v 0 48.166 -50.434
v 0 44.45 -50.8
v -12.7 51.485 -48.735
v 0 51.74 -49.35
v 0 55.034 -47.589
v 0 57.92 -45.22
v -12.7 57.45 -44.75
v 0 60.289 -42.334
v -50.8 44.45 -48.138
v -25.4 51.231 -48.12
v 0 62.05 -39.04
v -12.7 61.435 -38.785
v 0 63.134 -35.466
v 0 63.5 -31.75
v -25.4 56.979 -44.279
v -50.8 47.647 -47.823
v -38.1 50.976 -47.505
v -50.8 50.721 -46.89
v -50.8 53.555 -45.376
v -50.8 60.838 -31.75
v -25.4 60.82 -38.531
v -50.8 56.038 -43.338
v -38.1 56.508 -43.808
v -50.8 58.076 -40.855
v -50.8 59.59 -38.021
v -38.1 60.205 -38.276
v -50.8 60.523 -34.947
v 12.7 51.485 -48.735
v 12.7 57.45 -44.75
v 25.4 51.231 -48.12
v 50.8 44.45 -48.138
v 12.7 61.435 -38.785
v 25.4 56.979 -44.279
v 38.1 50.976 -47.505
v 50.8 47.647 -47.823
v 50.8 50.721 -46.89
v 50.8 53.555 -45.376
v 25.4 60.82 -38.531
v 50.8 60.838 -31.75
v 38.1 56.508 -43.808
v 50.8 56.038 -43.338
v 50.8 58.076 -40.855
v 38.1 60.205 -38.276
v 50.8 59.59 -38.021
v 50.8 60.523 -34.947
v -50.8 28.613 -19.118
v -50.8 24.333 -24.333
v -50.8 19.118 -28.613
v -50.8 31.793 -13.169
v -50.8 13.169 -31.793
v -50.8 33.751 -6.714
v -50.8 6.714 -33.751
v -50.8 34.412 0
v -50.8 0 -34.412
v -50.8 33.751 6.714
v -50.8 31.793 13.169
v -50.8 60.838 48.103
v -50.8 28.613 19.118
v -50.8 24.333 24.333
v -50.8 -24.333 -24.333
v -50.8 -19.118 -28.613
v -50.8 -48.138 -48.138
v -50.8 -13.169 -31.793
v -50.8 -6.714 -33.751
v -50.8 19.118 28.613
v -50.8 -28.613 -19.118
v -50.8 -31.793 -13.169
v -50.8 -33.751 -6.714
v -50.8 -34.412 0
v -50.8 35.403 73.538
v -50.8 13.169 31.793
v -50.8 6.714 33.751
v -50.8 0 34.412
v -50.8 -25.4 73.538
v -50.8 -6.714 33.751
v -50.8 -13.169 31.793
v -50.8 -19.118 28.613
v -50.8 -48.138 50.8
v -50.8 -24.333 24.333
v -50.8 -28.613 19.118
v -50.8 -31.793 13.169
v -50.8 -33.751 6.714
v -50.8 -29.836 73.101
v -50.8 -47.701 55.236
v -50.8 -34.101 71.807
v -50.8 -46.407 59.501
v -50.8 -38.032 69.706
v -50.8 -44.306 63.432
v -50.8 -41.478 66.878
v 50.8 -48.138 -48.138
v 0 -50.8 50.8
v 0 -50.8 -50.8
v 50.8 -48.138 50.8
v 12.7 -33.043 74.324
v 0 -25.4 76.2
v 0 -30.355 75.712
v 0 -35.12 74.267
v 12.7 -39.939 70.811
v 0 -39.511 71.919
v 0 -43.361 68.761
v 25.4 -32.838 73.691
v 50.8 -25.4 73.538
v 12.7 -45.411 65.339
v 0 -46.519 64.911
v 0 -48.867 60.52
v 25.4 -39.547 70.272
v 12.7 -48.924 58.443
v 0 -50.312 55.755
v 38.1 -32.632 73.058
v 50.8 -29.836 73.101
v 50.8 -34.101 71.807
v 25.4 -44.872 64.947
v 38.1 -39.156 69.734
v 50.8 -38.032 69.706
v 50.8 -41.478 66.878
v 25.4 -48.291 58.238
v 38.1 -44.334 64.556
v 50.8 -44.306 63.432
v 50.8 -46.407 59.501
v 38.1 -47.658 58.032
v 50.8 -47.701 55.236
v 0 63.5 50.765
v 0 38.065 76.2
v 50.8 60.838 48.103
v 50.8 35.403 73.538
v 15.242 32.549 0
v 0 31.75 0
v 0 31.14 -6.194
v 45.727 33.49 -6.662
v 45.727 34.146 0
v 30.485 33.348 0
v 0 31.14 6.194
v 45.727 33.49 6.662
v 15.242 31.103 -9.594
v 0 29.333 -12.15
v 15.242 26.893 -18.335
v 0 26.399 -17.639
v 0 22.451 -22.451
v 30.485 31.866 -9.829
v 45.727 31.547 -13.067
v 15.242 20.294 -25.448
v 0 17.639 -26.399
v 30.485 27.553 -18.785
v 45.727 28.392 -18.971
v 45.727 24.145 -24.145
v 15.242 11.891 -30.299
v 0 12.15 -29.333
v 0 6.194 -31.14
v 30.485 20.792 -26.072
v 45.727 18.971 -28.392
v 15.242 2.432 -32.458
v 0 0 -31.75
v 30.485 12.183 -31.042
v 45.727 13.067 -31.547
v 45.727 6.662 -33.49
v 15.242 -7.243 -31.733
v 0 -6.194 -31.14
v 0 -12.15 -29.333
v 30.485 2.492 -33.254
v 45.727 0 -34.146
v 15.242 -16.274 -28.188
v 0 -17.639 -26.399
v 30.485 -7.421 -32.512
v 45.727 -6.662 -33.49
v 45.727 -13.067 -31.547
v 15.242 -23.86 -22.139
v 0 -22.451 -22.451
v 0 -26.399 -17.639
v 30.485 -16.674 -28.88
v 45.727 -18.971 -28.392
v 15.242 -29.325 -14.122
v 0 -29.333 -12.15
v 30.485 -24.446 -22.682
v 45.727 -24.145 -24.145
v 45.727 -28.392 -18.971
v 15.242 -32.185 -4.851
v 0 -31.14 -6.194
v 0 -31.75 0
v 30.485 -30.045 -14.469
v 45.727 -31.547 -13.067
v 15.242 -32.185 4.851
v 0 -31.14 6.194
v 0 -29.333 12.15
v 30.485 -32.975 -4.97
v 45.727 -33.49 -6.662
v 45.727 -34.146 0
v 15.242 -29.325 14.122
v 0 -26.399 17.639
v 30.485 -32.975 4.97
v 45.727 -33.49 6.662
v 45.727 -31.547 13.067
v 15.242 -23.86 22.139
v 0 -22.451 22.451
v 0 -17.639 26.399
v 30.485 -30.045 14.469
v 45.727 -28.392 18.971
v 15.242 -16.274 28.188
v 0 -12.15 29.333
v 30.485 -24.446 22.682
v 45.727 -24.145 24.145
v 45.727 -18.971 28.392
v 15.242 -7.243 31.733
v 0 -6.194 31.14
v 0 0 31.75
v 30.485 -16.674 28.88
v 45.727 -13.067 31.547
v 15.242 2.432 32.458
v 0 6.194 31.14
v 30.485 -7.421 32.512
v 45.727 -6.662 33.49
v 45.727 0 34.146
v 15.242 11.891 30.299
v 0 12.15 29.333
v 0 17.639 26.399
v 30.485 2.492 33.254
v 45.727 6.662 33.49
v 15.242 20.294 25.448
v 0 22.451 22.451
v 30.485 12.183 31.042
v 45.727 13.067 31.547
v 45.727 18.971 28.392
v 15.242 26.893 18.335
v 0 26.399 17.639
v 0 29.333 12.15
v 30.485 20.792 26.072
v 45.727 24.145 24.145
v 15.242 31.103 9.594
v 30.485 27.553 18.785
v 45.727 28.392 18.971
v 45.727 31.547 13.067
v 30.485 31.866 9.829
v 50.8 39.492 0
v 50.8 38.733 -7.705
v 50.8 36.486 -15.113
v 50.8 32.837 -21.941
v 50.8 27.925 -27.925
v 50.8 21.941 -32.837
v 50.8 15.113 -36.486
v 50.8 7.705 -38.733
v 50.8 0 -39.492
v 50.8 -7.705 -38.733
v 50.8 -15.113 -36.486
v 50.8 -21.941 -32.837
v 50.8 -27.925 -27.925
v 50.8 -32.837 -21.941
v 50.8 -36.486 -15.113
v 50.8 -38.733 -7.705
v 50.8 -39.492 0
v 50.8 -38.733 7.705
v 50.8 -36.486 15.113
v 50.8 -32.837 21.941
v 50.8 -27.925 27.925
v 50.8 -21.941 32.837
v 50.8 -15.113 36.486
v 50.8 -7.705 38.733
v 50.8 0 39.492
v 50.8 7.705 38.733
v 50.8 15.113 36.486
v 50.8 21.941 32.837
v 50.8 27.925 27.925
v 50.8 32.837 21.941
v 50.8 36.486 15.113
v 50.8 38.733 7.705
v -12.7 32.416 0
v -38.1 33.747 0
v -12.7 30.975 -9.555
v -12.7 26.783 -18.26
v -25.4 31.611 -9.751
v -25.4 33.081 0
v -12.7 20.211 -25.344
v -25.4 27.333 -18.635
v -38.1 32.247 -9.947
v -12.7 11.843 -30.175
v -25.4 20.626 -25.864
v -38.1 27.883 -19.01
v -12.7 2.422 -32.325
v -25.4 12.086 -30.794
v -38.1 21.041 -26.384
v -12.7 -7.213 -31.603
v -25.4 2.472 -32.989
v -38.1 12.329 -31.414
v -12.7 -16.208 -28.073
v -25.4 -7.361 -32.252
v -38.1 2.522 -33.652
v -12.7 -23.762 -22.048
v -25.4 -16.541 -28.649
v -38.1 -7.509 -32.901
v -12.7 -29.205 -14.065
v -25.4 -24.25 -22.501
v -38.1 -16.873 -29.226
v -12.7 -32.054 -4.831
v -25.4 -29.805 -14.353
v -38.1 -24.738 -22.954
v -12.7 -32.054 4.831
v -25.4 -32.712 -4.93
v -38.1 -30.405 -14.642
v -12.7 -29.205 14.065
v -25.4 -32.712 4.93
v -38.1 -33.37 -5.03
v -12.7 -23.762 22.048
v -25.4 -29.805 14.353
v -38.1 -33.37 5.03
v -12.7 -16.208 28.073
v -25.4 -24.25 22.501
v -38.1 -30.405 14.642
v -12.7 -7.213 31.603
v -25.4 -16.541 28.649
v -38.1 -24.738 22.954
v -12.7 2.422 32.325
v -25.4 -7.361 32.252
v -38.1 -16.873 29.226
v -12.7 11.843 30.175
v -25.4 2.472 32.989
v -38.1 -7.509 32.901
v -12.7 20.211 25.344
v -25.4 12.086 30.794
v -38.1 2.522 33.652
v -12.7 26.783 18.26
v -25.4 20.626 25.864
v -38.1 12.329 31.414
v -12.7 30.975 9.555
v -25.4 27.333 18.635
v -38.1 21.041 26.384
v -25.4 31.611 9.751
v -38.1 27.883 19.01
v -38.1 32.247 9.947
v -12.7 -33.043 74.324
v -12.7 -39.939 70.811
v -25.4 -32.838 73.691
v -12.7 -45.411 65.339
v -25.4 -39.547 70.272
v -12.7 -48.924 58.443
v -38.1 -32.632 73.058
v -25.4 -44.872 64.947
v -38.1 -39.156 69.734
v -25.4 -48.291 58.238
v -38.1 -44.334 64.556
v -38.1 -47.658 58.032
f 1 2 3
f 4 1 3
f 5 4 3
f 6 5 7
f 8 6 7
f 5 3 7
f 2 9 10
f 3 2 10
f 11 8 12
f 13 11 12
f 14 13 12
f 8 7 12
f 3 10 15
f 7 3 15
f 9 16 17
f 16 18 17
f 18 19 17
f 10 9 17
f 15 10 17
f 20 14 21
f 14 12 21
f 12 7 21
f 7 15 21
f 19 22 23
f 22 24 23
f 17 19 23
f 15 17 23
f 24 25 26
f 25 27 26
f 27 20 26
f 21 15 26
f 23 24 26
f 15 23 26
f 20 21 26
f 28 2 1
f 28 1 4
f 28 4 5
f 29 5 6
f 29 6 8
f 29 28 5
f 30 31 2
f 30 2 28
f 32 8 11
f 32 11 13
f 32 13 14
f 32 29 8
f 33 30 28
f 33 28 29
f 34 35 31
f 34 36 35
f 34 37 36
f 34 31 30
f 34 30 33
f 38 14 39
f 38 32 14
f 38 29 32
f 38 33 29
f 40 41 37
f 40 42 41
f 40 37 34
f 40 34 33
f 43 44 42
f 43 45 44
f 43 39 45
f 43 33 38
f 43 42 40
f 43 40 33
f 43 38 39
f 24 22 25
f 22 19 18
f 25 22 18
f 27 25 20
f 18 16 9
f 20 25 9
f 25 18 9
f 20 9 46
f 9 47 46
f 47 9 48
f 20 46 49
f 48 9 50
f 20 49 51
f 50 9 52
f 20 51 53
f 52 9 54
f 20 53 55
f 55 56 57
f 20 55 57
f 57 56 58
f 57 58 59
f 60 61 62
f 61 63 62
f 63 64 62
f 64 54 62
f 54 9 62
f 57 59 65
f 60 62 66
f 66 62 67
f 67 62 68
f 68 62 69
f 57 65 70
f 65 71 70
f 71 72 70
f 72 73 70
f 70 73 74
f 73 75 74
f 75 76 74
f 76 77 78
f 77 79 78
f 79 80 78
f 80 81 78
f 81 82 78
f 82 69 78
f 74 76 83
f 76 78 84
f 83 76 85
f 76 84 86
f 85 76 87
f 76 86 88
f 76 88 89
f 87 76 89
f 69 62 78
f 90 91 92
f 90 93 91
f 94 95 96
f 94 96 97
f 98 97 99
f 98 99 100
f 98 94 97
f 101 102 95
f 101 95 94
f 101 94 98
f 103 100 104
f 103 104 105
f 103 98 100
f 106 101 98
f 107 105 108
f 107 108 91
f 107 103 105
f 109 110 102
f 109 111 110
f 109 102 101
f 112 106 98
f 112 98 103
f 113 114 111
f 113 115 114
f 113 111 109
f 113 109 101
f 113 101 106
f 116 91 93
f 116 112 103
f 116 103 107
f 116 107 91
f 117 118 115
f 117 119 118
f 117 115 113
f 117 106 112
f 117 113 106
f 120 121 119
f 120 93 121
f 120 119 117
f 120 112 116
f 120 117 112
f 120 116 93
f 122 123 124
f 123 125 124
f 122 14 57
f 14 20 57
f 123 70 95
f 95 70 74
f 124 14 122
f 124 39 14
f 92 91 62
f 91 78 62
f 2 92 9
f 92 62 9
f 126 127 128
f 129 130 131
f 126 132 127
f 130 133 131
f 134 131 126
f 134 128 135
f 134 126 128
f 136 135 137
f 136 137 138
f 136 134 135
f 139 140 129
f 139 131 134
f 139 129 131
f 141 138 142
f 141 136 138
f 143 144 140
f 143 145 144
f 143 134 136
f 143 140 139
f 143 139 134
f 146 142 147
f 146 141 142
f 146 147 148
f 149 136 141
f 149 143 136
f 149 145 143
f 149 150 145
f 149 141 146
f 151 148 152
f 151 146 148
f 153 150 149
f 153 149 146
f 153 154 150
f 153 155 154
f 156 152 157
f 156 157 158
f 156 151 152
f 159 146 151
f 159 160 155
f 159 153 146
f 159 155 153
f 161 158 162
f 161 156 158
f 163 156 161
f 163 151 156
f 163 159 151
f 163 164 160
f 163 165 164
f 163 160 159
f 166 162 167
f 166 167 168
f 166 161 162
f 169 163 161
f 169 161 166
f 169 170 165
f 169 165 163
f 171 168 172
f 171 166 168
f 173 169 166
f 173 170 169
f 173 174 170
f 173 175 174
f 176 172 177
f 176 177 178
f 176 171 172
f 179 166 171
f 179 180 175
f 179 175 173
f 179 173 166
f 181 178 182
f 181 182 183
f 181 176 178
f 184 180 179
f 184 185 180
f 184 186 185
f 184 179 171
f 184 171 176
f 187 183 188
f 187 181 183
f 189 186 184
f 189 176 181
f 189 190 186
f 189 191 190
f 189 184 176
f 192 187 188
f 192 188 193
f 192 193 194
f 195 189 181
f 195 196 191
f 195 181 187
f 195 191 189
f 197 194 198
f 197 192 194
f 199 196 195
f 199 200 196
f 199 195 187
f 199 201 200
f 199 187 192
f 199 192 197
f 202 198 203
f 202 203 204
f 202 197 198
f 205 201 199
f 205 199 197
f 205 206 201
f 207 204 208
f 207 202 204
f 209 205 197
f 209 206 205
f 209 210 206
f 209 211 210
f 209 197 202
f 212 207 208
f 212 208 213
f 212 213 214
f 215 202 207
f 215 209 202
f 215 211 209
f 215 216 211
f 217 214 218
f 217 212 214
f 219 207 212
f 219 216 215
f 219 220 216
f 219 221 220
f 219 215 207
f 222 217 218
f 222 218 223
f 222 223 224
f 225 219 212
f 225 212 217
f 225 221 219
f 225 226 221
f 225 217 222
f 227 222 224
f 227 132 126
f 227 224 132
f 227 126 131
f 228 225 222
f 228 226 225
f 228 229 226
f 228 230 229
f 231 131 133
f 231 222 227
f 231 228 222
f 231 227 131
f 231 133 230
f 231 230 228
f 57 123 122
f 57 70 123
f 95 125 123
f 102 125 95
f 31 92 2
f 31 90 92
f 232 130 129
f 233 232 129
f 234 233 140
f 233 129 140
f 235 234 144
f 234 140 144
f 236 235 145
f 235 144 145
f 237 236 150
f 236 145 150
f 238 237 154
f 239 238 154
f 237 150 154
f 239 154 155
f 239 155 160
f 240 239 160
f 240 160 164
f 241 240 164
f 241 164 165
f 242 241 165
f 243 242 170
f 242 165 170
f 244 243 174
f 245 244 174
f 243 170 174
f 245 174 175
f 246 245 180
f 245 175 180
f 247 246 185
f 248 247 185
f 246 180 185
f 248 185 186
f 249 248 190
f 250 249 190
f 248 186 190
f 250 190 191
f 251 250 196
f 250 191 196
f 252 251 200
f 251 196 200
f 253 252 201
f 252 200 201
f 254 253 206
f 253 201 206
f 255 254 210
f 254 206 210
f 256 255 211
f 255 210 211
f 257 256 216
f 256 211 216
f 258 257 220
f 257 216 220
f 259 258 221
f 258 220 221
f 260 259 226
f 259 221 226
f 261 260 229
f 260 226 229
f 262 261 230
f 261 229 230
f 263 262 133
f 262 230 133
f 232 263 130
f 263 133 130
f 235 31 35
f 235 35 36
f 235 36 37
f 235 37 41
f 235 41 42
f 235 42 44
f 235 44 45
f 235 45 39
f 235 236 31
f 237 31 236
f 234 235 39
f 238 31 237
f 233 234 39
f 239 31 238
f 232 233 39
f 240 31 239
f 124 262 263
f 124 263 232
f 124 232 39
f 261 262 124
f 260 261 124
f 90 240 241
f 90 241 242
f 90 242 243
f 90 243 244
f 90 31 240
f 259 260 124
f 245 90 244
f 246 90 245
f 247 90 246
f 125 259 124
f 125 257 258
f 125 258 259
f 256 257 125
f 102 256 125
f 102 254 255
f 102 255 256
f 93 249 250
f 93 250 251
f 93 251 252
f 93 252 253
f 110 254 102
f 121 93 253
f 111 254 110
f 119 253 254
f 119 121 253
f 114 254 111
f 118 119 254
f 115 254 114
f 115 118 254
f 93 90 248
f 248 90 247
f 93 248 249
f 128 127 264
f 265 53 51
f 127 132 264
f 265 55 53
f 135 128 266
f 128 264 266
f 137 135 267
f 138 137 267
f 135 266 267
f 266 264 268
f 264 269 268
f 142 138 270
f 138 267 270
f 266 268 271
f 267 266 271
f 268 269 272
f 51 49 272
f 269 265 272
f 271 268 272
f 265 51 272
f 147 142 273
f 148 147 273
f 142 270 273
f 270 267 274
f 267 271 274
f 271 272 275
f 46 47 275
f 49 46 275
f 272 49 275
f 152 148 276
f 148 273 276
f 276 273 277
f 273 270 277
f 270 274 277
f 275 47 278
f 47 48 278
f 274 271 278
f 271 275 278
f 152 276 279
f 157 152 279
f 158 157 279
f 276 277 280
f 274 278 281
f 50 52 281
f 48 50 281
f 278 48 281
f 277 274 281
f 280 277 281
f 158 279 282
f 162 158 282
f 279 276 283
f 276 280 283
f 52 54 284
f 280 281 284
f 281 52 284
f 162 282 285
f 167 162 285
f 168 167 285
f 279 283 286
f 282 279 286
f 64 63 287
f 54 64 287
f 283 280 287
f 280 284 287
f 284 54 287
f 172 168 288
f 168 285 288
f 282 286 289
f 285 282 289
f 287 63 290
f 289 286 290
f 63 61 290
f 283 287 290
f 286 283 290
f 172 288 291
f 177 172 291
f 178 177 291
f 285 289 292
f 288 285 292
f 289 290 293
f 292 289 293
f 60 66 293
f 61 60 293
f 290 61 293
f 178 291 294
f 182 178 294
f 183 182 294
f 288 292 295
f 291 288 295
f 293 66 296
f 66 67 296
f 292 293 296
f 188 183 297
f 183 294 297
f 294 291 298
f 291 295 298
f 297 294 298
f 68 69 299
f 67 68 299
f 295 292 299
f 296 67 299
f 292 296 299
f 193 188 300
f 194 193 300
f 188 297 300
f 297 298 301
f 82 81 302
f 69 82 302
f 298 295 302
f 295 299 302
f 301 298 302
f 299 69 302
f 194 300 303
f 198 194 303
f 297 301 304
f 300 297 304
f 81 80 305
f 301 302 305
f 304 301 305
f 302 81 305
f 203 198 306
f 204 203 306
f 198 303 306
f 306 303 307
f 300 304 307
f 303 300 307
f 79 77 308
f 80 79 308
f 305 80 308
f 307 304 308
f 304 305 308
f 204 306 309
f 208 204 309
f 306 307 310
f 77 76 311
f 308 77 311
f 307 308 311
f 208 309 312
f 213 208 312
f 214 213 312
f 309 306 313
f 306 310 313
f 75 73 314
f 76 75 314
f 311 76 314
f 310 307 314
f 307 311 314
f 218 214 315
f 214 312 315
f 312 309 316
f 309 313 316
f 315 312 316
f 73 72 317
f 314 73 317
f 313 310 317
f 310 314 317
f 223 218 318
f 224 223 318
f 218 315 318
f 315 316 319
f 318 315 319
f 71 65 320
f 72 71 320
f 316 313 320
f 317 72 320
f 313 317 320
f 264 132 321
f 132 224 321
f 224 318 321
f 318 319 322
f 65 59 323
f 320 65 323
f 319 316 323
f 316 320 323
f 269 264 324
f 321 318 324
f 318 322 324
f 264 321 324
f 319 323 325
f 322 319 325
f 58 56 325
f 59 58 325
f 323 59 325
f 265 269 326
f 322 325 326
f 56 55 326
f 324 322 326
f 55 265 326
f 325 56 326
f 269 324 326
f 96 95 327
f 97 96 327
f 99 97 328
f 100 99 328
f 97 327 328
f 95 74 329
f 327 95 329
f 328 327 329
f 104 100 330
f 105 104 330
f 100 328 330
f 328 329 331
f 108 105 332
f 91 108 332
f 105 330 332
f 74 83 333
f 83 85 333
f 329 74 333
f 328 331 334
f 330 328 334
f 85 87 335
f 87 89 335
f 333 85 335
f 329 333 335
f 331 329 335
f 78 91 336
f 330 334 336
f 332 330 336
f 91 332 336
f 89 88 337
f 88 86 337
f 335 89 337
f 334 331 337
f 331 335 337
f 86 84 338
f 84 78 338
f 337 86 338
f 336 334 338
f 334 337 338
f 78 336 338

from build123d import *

# Parameters (mm, degrees)
F0_R     = 31.75
F1_DEPTH = 50.8
F1_TAPER = 3
F2_SIZE  = 25.4
F3_SIZE  = 5.08


with BuildPart() as f1:
    # F0 (on Right) → F1 (new body, symmetric)
    with BuildSketch(Plane.YZ):
        with BuildLine():
            Line((63.5, 76.2), (-25.4, 76.2))
            ThreePointArc((-25.4, 76.2), (-43.3605122421, 68.7605122421), (-50.8, 50.8))
            Line((-50.8, 50.8), (-50.8, -50.8))
            Line((-50.8, -50.8), (44.45, -50.8))
            ThreePointArc((44.45, -50.8), (57.9203841816, -45.2203841816), (63.5, -31.75))
            Line((63.5, -31.75), (63.5, 76.2))
        make_face()
        Circle(F0_R, mode=Mode.SUBTRACT)
    extrude(amount=F1_DEPTH, both=True, taper=F1_TAPER)

    # F2
    f2_edges = [f1.edges().sort_by_distance(p)[0] for p in [
        (25.4, 62.168842, 74.868842),
        (-25.4, 62.168842, 74.868842),
    ]]
    chamfer(f2_edges, length=F2_SIZE)

    # F3
    f3_edges = [f1.edges().sort_by_distance(p)[0] for p in [
        (50.8, -34.412315, 0),
    ]]
    chamfer(f3_edges, length=F3_SIZE)


solid = f1.part
